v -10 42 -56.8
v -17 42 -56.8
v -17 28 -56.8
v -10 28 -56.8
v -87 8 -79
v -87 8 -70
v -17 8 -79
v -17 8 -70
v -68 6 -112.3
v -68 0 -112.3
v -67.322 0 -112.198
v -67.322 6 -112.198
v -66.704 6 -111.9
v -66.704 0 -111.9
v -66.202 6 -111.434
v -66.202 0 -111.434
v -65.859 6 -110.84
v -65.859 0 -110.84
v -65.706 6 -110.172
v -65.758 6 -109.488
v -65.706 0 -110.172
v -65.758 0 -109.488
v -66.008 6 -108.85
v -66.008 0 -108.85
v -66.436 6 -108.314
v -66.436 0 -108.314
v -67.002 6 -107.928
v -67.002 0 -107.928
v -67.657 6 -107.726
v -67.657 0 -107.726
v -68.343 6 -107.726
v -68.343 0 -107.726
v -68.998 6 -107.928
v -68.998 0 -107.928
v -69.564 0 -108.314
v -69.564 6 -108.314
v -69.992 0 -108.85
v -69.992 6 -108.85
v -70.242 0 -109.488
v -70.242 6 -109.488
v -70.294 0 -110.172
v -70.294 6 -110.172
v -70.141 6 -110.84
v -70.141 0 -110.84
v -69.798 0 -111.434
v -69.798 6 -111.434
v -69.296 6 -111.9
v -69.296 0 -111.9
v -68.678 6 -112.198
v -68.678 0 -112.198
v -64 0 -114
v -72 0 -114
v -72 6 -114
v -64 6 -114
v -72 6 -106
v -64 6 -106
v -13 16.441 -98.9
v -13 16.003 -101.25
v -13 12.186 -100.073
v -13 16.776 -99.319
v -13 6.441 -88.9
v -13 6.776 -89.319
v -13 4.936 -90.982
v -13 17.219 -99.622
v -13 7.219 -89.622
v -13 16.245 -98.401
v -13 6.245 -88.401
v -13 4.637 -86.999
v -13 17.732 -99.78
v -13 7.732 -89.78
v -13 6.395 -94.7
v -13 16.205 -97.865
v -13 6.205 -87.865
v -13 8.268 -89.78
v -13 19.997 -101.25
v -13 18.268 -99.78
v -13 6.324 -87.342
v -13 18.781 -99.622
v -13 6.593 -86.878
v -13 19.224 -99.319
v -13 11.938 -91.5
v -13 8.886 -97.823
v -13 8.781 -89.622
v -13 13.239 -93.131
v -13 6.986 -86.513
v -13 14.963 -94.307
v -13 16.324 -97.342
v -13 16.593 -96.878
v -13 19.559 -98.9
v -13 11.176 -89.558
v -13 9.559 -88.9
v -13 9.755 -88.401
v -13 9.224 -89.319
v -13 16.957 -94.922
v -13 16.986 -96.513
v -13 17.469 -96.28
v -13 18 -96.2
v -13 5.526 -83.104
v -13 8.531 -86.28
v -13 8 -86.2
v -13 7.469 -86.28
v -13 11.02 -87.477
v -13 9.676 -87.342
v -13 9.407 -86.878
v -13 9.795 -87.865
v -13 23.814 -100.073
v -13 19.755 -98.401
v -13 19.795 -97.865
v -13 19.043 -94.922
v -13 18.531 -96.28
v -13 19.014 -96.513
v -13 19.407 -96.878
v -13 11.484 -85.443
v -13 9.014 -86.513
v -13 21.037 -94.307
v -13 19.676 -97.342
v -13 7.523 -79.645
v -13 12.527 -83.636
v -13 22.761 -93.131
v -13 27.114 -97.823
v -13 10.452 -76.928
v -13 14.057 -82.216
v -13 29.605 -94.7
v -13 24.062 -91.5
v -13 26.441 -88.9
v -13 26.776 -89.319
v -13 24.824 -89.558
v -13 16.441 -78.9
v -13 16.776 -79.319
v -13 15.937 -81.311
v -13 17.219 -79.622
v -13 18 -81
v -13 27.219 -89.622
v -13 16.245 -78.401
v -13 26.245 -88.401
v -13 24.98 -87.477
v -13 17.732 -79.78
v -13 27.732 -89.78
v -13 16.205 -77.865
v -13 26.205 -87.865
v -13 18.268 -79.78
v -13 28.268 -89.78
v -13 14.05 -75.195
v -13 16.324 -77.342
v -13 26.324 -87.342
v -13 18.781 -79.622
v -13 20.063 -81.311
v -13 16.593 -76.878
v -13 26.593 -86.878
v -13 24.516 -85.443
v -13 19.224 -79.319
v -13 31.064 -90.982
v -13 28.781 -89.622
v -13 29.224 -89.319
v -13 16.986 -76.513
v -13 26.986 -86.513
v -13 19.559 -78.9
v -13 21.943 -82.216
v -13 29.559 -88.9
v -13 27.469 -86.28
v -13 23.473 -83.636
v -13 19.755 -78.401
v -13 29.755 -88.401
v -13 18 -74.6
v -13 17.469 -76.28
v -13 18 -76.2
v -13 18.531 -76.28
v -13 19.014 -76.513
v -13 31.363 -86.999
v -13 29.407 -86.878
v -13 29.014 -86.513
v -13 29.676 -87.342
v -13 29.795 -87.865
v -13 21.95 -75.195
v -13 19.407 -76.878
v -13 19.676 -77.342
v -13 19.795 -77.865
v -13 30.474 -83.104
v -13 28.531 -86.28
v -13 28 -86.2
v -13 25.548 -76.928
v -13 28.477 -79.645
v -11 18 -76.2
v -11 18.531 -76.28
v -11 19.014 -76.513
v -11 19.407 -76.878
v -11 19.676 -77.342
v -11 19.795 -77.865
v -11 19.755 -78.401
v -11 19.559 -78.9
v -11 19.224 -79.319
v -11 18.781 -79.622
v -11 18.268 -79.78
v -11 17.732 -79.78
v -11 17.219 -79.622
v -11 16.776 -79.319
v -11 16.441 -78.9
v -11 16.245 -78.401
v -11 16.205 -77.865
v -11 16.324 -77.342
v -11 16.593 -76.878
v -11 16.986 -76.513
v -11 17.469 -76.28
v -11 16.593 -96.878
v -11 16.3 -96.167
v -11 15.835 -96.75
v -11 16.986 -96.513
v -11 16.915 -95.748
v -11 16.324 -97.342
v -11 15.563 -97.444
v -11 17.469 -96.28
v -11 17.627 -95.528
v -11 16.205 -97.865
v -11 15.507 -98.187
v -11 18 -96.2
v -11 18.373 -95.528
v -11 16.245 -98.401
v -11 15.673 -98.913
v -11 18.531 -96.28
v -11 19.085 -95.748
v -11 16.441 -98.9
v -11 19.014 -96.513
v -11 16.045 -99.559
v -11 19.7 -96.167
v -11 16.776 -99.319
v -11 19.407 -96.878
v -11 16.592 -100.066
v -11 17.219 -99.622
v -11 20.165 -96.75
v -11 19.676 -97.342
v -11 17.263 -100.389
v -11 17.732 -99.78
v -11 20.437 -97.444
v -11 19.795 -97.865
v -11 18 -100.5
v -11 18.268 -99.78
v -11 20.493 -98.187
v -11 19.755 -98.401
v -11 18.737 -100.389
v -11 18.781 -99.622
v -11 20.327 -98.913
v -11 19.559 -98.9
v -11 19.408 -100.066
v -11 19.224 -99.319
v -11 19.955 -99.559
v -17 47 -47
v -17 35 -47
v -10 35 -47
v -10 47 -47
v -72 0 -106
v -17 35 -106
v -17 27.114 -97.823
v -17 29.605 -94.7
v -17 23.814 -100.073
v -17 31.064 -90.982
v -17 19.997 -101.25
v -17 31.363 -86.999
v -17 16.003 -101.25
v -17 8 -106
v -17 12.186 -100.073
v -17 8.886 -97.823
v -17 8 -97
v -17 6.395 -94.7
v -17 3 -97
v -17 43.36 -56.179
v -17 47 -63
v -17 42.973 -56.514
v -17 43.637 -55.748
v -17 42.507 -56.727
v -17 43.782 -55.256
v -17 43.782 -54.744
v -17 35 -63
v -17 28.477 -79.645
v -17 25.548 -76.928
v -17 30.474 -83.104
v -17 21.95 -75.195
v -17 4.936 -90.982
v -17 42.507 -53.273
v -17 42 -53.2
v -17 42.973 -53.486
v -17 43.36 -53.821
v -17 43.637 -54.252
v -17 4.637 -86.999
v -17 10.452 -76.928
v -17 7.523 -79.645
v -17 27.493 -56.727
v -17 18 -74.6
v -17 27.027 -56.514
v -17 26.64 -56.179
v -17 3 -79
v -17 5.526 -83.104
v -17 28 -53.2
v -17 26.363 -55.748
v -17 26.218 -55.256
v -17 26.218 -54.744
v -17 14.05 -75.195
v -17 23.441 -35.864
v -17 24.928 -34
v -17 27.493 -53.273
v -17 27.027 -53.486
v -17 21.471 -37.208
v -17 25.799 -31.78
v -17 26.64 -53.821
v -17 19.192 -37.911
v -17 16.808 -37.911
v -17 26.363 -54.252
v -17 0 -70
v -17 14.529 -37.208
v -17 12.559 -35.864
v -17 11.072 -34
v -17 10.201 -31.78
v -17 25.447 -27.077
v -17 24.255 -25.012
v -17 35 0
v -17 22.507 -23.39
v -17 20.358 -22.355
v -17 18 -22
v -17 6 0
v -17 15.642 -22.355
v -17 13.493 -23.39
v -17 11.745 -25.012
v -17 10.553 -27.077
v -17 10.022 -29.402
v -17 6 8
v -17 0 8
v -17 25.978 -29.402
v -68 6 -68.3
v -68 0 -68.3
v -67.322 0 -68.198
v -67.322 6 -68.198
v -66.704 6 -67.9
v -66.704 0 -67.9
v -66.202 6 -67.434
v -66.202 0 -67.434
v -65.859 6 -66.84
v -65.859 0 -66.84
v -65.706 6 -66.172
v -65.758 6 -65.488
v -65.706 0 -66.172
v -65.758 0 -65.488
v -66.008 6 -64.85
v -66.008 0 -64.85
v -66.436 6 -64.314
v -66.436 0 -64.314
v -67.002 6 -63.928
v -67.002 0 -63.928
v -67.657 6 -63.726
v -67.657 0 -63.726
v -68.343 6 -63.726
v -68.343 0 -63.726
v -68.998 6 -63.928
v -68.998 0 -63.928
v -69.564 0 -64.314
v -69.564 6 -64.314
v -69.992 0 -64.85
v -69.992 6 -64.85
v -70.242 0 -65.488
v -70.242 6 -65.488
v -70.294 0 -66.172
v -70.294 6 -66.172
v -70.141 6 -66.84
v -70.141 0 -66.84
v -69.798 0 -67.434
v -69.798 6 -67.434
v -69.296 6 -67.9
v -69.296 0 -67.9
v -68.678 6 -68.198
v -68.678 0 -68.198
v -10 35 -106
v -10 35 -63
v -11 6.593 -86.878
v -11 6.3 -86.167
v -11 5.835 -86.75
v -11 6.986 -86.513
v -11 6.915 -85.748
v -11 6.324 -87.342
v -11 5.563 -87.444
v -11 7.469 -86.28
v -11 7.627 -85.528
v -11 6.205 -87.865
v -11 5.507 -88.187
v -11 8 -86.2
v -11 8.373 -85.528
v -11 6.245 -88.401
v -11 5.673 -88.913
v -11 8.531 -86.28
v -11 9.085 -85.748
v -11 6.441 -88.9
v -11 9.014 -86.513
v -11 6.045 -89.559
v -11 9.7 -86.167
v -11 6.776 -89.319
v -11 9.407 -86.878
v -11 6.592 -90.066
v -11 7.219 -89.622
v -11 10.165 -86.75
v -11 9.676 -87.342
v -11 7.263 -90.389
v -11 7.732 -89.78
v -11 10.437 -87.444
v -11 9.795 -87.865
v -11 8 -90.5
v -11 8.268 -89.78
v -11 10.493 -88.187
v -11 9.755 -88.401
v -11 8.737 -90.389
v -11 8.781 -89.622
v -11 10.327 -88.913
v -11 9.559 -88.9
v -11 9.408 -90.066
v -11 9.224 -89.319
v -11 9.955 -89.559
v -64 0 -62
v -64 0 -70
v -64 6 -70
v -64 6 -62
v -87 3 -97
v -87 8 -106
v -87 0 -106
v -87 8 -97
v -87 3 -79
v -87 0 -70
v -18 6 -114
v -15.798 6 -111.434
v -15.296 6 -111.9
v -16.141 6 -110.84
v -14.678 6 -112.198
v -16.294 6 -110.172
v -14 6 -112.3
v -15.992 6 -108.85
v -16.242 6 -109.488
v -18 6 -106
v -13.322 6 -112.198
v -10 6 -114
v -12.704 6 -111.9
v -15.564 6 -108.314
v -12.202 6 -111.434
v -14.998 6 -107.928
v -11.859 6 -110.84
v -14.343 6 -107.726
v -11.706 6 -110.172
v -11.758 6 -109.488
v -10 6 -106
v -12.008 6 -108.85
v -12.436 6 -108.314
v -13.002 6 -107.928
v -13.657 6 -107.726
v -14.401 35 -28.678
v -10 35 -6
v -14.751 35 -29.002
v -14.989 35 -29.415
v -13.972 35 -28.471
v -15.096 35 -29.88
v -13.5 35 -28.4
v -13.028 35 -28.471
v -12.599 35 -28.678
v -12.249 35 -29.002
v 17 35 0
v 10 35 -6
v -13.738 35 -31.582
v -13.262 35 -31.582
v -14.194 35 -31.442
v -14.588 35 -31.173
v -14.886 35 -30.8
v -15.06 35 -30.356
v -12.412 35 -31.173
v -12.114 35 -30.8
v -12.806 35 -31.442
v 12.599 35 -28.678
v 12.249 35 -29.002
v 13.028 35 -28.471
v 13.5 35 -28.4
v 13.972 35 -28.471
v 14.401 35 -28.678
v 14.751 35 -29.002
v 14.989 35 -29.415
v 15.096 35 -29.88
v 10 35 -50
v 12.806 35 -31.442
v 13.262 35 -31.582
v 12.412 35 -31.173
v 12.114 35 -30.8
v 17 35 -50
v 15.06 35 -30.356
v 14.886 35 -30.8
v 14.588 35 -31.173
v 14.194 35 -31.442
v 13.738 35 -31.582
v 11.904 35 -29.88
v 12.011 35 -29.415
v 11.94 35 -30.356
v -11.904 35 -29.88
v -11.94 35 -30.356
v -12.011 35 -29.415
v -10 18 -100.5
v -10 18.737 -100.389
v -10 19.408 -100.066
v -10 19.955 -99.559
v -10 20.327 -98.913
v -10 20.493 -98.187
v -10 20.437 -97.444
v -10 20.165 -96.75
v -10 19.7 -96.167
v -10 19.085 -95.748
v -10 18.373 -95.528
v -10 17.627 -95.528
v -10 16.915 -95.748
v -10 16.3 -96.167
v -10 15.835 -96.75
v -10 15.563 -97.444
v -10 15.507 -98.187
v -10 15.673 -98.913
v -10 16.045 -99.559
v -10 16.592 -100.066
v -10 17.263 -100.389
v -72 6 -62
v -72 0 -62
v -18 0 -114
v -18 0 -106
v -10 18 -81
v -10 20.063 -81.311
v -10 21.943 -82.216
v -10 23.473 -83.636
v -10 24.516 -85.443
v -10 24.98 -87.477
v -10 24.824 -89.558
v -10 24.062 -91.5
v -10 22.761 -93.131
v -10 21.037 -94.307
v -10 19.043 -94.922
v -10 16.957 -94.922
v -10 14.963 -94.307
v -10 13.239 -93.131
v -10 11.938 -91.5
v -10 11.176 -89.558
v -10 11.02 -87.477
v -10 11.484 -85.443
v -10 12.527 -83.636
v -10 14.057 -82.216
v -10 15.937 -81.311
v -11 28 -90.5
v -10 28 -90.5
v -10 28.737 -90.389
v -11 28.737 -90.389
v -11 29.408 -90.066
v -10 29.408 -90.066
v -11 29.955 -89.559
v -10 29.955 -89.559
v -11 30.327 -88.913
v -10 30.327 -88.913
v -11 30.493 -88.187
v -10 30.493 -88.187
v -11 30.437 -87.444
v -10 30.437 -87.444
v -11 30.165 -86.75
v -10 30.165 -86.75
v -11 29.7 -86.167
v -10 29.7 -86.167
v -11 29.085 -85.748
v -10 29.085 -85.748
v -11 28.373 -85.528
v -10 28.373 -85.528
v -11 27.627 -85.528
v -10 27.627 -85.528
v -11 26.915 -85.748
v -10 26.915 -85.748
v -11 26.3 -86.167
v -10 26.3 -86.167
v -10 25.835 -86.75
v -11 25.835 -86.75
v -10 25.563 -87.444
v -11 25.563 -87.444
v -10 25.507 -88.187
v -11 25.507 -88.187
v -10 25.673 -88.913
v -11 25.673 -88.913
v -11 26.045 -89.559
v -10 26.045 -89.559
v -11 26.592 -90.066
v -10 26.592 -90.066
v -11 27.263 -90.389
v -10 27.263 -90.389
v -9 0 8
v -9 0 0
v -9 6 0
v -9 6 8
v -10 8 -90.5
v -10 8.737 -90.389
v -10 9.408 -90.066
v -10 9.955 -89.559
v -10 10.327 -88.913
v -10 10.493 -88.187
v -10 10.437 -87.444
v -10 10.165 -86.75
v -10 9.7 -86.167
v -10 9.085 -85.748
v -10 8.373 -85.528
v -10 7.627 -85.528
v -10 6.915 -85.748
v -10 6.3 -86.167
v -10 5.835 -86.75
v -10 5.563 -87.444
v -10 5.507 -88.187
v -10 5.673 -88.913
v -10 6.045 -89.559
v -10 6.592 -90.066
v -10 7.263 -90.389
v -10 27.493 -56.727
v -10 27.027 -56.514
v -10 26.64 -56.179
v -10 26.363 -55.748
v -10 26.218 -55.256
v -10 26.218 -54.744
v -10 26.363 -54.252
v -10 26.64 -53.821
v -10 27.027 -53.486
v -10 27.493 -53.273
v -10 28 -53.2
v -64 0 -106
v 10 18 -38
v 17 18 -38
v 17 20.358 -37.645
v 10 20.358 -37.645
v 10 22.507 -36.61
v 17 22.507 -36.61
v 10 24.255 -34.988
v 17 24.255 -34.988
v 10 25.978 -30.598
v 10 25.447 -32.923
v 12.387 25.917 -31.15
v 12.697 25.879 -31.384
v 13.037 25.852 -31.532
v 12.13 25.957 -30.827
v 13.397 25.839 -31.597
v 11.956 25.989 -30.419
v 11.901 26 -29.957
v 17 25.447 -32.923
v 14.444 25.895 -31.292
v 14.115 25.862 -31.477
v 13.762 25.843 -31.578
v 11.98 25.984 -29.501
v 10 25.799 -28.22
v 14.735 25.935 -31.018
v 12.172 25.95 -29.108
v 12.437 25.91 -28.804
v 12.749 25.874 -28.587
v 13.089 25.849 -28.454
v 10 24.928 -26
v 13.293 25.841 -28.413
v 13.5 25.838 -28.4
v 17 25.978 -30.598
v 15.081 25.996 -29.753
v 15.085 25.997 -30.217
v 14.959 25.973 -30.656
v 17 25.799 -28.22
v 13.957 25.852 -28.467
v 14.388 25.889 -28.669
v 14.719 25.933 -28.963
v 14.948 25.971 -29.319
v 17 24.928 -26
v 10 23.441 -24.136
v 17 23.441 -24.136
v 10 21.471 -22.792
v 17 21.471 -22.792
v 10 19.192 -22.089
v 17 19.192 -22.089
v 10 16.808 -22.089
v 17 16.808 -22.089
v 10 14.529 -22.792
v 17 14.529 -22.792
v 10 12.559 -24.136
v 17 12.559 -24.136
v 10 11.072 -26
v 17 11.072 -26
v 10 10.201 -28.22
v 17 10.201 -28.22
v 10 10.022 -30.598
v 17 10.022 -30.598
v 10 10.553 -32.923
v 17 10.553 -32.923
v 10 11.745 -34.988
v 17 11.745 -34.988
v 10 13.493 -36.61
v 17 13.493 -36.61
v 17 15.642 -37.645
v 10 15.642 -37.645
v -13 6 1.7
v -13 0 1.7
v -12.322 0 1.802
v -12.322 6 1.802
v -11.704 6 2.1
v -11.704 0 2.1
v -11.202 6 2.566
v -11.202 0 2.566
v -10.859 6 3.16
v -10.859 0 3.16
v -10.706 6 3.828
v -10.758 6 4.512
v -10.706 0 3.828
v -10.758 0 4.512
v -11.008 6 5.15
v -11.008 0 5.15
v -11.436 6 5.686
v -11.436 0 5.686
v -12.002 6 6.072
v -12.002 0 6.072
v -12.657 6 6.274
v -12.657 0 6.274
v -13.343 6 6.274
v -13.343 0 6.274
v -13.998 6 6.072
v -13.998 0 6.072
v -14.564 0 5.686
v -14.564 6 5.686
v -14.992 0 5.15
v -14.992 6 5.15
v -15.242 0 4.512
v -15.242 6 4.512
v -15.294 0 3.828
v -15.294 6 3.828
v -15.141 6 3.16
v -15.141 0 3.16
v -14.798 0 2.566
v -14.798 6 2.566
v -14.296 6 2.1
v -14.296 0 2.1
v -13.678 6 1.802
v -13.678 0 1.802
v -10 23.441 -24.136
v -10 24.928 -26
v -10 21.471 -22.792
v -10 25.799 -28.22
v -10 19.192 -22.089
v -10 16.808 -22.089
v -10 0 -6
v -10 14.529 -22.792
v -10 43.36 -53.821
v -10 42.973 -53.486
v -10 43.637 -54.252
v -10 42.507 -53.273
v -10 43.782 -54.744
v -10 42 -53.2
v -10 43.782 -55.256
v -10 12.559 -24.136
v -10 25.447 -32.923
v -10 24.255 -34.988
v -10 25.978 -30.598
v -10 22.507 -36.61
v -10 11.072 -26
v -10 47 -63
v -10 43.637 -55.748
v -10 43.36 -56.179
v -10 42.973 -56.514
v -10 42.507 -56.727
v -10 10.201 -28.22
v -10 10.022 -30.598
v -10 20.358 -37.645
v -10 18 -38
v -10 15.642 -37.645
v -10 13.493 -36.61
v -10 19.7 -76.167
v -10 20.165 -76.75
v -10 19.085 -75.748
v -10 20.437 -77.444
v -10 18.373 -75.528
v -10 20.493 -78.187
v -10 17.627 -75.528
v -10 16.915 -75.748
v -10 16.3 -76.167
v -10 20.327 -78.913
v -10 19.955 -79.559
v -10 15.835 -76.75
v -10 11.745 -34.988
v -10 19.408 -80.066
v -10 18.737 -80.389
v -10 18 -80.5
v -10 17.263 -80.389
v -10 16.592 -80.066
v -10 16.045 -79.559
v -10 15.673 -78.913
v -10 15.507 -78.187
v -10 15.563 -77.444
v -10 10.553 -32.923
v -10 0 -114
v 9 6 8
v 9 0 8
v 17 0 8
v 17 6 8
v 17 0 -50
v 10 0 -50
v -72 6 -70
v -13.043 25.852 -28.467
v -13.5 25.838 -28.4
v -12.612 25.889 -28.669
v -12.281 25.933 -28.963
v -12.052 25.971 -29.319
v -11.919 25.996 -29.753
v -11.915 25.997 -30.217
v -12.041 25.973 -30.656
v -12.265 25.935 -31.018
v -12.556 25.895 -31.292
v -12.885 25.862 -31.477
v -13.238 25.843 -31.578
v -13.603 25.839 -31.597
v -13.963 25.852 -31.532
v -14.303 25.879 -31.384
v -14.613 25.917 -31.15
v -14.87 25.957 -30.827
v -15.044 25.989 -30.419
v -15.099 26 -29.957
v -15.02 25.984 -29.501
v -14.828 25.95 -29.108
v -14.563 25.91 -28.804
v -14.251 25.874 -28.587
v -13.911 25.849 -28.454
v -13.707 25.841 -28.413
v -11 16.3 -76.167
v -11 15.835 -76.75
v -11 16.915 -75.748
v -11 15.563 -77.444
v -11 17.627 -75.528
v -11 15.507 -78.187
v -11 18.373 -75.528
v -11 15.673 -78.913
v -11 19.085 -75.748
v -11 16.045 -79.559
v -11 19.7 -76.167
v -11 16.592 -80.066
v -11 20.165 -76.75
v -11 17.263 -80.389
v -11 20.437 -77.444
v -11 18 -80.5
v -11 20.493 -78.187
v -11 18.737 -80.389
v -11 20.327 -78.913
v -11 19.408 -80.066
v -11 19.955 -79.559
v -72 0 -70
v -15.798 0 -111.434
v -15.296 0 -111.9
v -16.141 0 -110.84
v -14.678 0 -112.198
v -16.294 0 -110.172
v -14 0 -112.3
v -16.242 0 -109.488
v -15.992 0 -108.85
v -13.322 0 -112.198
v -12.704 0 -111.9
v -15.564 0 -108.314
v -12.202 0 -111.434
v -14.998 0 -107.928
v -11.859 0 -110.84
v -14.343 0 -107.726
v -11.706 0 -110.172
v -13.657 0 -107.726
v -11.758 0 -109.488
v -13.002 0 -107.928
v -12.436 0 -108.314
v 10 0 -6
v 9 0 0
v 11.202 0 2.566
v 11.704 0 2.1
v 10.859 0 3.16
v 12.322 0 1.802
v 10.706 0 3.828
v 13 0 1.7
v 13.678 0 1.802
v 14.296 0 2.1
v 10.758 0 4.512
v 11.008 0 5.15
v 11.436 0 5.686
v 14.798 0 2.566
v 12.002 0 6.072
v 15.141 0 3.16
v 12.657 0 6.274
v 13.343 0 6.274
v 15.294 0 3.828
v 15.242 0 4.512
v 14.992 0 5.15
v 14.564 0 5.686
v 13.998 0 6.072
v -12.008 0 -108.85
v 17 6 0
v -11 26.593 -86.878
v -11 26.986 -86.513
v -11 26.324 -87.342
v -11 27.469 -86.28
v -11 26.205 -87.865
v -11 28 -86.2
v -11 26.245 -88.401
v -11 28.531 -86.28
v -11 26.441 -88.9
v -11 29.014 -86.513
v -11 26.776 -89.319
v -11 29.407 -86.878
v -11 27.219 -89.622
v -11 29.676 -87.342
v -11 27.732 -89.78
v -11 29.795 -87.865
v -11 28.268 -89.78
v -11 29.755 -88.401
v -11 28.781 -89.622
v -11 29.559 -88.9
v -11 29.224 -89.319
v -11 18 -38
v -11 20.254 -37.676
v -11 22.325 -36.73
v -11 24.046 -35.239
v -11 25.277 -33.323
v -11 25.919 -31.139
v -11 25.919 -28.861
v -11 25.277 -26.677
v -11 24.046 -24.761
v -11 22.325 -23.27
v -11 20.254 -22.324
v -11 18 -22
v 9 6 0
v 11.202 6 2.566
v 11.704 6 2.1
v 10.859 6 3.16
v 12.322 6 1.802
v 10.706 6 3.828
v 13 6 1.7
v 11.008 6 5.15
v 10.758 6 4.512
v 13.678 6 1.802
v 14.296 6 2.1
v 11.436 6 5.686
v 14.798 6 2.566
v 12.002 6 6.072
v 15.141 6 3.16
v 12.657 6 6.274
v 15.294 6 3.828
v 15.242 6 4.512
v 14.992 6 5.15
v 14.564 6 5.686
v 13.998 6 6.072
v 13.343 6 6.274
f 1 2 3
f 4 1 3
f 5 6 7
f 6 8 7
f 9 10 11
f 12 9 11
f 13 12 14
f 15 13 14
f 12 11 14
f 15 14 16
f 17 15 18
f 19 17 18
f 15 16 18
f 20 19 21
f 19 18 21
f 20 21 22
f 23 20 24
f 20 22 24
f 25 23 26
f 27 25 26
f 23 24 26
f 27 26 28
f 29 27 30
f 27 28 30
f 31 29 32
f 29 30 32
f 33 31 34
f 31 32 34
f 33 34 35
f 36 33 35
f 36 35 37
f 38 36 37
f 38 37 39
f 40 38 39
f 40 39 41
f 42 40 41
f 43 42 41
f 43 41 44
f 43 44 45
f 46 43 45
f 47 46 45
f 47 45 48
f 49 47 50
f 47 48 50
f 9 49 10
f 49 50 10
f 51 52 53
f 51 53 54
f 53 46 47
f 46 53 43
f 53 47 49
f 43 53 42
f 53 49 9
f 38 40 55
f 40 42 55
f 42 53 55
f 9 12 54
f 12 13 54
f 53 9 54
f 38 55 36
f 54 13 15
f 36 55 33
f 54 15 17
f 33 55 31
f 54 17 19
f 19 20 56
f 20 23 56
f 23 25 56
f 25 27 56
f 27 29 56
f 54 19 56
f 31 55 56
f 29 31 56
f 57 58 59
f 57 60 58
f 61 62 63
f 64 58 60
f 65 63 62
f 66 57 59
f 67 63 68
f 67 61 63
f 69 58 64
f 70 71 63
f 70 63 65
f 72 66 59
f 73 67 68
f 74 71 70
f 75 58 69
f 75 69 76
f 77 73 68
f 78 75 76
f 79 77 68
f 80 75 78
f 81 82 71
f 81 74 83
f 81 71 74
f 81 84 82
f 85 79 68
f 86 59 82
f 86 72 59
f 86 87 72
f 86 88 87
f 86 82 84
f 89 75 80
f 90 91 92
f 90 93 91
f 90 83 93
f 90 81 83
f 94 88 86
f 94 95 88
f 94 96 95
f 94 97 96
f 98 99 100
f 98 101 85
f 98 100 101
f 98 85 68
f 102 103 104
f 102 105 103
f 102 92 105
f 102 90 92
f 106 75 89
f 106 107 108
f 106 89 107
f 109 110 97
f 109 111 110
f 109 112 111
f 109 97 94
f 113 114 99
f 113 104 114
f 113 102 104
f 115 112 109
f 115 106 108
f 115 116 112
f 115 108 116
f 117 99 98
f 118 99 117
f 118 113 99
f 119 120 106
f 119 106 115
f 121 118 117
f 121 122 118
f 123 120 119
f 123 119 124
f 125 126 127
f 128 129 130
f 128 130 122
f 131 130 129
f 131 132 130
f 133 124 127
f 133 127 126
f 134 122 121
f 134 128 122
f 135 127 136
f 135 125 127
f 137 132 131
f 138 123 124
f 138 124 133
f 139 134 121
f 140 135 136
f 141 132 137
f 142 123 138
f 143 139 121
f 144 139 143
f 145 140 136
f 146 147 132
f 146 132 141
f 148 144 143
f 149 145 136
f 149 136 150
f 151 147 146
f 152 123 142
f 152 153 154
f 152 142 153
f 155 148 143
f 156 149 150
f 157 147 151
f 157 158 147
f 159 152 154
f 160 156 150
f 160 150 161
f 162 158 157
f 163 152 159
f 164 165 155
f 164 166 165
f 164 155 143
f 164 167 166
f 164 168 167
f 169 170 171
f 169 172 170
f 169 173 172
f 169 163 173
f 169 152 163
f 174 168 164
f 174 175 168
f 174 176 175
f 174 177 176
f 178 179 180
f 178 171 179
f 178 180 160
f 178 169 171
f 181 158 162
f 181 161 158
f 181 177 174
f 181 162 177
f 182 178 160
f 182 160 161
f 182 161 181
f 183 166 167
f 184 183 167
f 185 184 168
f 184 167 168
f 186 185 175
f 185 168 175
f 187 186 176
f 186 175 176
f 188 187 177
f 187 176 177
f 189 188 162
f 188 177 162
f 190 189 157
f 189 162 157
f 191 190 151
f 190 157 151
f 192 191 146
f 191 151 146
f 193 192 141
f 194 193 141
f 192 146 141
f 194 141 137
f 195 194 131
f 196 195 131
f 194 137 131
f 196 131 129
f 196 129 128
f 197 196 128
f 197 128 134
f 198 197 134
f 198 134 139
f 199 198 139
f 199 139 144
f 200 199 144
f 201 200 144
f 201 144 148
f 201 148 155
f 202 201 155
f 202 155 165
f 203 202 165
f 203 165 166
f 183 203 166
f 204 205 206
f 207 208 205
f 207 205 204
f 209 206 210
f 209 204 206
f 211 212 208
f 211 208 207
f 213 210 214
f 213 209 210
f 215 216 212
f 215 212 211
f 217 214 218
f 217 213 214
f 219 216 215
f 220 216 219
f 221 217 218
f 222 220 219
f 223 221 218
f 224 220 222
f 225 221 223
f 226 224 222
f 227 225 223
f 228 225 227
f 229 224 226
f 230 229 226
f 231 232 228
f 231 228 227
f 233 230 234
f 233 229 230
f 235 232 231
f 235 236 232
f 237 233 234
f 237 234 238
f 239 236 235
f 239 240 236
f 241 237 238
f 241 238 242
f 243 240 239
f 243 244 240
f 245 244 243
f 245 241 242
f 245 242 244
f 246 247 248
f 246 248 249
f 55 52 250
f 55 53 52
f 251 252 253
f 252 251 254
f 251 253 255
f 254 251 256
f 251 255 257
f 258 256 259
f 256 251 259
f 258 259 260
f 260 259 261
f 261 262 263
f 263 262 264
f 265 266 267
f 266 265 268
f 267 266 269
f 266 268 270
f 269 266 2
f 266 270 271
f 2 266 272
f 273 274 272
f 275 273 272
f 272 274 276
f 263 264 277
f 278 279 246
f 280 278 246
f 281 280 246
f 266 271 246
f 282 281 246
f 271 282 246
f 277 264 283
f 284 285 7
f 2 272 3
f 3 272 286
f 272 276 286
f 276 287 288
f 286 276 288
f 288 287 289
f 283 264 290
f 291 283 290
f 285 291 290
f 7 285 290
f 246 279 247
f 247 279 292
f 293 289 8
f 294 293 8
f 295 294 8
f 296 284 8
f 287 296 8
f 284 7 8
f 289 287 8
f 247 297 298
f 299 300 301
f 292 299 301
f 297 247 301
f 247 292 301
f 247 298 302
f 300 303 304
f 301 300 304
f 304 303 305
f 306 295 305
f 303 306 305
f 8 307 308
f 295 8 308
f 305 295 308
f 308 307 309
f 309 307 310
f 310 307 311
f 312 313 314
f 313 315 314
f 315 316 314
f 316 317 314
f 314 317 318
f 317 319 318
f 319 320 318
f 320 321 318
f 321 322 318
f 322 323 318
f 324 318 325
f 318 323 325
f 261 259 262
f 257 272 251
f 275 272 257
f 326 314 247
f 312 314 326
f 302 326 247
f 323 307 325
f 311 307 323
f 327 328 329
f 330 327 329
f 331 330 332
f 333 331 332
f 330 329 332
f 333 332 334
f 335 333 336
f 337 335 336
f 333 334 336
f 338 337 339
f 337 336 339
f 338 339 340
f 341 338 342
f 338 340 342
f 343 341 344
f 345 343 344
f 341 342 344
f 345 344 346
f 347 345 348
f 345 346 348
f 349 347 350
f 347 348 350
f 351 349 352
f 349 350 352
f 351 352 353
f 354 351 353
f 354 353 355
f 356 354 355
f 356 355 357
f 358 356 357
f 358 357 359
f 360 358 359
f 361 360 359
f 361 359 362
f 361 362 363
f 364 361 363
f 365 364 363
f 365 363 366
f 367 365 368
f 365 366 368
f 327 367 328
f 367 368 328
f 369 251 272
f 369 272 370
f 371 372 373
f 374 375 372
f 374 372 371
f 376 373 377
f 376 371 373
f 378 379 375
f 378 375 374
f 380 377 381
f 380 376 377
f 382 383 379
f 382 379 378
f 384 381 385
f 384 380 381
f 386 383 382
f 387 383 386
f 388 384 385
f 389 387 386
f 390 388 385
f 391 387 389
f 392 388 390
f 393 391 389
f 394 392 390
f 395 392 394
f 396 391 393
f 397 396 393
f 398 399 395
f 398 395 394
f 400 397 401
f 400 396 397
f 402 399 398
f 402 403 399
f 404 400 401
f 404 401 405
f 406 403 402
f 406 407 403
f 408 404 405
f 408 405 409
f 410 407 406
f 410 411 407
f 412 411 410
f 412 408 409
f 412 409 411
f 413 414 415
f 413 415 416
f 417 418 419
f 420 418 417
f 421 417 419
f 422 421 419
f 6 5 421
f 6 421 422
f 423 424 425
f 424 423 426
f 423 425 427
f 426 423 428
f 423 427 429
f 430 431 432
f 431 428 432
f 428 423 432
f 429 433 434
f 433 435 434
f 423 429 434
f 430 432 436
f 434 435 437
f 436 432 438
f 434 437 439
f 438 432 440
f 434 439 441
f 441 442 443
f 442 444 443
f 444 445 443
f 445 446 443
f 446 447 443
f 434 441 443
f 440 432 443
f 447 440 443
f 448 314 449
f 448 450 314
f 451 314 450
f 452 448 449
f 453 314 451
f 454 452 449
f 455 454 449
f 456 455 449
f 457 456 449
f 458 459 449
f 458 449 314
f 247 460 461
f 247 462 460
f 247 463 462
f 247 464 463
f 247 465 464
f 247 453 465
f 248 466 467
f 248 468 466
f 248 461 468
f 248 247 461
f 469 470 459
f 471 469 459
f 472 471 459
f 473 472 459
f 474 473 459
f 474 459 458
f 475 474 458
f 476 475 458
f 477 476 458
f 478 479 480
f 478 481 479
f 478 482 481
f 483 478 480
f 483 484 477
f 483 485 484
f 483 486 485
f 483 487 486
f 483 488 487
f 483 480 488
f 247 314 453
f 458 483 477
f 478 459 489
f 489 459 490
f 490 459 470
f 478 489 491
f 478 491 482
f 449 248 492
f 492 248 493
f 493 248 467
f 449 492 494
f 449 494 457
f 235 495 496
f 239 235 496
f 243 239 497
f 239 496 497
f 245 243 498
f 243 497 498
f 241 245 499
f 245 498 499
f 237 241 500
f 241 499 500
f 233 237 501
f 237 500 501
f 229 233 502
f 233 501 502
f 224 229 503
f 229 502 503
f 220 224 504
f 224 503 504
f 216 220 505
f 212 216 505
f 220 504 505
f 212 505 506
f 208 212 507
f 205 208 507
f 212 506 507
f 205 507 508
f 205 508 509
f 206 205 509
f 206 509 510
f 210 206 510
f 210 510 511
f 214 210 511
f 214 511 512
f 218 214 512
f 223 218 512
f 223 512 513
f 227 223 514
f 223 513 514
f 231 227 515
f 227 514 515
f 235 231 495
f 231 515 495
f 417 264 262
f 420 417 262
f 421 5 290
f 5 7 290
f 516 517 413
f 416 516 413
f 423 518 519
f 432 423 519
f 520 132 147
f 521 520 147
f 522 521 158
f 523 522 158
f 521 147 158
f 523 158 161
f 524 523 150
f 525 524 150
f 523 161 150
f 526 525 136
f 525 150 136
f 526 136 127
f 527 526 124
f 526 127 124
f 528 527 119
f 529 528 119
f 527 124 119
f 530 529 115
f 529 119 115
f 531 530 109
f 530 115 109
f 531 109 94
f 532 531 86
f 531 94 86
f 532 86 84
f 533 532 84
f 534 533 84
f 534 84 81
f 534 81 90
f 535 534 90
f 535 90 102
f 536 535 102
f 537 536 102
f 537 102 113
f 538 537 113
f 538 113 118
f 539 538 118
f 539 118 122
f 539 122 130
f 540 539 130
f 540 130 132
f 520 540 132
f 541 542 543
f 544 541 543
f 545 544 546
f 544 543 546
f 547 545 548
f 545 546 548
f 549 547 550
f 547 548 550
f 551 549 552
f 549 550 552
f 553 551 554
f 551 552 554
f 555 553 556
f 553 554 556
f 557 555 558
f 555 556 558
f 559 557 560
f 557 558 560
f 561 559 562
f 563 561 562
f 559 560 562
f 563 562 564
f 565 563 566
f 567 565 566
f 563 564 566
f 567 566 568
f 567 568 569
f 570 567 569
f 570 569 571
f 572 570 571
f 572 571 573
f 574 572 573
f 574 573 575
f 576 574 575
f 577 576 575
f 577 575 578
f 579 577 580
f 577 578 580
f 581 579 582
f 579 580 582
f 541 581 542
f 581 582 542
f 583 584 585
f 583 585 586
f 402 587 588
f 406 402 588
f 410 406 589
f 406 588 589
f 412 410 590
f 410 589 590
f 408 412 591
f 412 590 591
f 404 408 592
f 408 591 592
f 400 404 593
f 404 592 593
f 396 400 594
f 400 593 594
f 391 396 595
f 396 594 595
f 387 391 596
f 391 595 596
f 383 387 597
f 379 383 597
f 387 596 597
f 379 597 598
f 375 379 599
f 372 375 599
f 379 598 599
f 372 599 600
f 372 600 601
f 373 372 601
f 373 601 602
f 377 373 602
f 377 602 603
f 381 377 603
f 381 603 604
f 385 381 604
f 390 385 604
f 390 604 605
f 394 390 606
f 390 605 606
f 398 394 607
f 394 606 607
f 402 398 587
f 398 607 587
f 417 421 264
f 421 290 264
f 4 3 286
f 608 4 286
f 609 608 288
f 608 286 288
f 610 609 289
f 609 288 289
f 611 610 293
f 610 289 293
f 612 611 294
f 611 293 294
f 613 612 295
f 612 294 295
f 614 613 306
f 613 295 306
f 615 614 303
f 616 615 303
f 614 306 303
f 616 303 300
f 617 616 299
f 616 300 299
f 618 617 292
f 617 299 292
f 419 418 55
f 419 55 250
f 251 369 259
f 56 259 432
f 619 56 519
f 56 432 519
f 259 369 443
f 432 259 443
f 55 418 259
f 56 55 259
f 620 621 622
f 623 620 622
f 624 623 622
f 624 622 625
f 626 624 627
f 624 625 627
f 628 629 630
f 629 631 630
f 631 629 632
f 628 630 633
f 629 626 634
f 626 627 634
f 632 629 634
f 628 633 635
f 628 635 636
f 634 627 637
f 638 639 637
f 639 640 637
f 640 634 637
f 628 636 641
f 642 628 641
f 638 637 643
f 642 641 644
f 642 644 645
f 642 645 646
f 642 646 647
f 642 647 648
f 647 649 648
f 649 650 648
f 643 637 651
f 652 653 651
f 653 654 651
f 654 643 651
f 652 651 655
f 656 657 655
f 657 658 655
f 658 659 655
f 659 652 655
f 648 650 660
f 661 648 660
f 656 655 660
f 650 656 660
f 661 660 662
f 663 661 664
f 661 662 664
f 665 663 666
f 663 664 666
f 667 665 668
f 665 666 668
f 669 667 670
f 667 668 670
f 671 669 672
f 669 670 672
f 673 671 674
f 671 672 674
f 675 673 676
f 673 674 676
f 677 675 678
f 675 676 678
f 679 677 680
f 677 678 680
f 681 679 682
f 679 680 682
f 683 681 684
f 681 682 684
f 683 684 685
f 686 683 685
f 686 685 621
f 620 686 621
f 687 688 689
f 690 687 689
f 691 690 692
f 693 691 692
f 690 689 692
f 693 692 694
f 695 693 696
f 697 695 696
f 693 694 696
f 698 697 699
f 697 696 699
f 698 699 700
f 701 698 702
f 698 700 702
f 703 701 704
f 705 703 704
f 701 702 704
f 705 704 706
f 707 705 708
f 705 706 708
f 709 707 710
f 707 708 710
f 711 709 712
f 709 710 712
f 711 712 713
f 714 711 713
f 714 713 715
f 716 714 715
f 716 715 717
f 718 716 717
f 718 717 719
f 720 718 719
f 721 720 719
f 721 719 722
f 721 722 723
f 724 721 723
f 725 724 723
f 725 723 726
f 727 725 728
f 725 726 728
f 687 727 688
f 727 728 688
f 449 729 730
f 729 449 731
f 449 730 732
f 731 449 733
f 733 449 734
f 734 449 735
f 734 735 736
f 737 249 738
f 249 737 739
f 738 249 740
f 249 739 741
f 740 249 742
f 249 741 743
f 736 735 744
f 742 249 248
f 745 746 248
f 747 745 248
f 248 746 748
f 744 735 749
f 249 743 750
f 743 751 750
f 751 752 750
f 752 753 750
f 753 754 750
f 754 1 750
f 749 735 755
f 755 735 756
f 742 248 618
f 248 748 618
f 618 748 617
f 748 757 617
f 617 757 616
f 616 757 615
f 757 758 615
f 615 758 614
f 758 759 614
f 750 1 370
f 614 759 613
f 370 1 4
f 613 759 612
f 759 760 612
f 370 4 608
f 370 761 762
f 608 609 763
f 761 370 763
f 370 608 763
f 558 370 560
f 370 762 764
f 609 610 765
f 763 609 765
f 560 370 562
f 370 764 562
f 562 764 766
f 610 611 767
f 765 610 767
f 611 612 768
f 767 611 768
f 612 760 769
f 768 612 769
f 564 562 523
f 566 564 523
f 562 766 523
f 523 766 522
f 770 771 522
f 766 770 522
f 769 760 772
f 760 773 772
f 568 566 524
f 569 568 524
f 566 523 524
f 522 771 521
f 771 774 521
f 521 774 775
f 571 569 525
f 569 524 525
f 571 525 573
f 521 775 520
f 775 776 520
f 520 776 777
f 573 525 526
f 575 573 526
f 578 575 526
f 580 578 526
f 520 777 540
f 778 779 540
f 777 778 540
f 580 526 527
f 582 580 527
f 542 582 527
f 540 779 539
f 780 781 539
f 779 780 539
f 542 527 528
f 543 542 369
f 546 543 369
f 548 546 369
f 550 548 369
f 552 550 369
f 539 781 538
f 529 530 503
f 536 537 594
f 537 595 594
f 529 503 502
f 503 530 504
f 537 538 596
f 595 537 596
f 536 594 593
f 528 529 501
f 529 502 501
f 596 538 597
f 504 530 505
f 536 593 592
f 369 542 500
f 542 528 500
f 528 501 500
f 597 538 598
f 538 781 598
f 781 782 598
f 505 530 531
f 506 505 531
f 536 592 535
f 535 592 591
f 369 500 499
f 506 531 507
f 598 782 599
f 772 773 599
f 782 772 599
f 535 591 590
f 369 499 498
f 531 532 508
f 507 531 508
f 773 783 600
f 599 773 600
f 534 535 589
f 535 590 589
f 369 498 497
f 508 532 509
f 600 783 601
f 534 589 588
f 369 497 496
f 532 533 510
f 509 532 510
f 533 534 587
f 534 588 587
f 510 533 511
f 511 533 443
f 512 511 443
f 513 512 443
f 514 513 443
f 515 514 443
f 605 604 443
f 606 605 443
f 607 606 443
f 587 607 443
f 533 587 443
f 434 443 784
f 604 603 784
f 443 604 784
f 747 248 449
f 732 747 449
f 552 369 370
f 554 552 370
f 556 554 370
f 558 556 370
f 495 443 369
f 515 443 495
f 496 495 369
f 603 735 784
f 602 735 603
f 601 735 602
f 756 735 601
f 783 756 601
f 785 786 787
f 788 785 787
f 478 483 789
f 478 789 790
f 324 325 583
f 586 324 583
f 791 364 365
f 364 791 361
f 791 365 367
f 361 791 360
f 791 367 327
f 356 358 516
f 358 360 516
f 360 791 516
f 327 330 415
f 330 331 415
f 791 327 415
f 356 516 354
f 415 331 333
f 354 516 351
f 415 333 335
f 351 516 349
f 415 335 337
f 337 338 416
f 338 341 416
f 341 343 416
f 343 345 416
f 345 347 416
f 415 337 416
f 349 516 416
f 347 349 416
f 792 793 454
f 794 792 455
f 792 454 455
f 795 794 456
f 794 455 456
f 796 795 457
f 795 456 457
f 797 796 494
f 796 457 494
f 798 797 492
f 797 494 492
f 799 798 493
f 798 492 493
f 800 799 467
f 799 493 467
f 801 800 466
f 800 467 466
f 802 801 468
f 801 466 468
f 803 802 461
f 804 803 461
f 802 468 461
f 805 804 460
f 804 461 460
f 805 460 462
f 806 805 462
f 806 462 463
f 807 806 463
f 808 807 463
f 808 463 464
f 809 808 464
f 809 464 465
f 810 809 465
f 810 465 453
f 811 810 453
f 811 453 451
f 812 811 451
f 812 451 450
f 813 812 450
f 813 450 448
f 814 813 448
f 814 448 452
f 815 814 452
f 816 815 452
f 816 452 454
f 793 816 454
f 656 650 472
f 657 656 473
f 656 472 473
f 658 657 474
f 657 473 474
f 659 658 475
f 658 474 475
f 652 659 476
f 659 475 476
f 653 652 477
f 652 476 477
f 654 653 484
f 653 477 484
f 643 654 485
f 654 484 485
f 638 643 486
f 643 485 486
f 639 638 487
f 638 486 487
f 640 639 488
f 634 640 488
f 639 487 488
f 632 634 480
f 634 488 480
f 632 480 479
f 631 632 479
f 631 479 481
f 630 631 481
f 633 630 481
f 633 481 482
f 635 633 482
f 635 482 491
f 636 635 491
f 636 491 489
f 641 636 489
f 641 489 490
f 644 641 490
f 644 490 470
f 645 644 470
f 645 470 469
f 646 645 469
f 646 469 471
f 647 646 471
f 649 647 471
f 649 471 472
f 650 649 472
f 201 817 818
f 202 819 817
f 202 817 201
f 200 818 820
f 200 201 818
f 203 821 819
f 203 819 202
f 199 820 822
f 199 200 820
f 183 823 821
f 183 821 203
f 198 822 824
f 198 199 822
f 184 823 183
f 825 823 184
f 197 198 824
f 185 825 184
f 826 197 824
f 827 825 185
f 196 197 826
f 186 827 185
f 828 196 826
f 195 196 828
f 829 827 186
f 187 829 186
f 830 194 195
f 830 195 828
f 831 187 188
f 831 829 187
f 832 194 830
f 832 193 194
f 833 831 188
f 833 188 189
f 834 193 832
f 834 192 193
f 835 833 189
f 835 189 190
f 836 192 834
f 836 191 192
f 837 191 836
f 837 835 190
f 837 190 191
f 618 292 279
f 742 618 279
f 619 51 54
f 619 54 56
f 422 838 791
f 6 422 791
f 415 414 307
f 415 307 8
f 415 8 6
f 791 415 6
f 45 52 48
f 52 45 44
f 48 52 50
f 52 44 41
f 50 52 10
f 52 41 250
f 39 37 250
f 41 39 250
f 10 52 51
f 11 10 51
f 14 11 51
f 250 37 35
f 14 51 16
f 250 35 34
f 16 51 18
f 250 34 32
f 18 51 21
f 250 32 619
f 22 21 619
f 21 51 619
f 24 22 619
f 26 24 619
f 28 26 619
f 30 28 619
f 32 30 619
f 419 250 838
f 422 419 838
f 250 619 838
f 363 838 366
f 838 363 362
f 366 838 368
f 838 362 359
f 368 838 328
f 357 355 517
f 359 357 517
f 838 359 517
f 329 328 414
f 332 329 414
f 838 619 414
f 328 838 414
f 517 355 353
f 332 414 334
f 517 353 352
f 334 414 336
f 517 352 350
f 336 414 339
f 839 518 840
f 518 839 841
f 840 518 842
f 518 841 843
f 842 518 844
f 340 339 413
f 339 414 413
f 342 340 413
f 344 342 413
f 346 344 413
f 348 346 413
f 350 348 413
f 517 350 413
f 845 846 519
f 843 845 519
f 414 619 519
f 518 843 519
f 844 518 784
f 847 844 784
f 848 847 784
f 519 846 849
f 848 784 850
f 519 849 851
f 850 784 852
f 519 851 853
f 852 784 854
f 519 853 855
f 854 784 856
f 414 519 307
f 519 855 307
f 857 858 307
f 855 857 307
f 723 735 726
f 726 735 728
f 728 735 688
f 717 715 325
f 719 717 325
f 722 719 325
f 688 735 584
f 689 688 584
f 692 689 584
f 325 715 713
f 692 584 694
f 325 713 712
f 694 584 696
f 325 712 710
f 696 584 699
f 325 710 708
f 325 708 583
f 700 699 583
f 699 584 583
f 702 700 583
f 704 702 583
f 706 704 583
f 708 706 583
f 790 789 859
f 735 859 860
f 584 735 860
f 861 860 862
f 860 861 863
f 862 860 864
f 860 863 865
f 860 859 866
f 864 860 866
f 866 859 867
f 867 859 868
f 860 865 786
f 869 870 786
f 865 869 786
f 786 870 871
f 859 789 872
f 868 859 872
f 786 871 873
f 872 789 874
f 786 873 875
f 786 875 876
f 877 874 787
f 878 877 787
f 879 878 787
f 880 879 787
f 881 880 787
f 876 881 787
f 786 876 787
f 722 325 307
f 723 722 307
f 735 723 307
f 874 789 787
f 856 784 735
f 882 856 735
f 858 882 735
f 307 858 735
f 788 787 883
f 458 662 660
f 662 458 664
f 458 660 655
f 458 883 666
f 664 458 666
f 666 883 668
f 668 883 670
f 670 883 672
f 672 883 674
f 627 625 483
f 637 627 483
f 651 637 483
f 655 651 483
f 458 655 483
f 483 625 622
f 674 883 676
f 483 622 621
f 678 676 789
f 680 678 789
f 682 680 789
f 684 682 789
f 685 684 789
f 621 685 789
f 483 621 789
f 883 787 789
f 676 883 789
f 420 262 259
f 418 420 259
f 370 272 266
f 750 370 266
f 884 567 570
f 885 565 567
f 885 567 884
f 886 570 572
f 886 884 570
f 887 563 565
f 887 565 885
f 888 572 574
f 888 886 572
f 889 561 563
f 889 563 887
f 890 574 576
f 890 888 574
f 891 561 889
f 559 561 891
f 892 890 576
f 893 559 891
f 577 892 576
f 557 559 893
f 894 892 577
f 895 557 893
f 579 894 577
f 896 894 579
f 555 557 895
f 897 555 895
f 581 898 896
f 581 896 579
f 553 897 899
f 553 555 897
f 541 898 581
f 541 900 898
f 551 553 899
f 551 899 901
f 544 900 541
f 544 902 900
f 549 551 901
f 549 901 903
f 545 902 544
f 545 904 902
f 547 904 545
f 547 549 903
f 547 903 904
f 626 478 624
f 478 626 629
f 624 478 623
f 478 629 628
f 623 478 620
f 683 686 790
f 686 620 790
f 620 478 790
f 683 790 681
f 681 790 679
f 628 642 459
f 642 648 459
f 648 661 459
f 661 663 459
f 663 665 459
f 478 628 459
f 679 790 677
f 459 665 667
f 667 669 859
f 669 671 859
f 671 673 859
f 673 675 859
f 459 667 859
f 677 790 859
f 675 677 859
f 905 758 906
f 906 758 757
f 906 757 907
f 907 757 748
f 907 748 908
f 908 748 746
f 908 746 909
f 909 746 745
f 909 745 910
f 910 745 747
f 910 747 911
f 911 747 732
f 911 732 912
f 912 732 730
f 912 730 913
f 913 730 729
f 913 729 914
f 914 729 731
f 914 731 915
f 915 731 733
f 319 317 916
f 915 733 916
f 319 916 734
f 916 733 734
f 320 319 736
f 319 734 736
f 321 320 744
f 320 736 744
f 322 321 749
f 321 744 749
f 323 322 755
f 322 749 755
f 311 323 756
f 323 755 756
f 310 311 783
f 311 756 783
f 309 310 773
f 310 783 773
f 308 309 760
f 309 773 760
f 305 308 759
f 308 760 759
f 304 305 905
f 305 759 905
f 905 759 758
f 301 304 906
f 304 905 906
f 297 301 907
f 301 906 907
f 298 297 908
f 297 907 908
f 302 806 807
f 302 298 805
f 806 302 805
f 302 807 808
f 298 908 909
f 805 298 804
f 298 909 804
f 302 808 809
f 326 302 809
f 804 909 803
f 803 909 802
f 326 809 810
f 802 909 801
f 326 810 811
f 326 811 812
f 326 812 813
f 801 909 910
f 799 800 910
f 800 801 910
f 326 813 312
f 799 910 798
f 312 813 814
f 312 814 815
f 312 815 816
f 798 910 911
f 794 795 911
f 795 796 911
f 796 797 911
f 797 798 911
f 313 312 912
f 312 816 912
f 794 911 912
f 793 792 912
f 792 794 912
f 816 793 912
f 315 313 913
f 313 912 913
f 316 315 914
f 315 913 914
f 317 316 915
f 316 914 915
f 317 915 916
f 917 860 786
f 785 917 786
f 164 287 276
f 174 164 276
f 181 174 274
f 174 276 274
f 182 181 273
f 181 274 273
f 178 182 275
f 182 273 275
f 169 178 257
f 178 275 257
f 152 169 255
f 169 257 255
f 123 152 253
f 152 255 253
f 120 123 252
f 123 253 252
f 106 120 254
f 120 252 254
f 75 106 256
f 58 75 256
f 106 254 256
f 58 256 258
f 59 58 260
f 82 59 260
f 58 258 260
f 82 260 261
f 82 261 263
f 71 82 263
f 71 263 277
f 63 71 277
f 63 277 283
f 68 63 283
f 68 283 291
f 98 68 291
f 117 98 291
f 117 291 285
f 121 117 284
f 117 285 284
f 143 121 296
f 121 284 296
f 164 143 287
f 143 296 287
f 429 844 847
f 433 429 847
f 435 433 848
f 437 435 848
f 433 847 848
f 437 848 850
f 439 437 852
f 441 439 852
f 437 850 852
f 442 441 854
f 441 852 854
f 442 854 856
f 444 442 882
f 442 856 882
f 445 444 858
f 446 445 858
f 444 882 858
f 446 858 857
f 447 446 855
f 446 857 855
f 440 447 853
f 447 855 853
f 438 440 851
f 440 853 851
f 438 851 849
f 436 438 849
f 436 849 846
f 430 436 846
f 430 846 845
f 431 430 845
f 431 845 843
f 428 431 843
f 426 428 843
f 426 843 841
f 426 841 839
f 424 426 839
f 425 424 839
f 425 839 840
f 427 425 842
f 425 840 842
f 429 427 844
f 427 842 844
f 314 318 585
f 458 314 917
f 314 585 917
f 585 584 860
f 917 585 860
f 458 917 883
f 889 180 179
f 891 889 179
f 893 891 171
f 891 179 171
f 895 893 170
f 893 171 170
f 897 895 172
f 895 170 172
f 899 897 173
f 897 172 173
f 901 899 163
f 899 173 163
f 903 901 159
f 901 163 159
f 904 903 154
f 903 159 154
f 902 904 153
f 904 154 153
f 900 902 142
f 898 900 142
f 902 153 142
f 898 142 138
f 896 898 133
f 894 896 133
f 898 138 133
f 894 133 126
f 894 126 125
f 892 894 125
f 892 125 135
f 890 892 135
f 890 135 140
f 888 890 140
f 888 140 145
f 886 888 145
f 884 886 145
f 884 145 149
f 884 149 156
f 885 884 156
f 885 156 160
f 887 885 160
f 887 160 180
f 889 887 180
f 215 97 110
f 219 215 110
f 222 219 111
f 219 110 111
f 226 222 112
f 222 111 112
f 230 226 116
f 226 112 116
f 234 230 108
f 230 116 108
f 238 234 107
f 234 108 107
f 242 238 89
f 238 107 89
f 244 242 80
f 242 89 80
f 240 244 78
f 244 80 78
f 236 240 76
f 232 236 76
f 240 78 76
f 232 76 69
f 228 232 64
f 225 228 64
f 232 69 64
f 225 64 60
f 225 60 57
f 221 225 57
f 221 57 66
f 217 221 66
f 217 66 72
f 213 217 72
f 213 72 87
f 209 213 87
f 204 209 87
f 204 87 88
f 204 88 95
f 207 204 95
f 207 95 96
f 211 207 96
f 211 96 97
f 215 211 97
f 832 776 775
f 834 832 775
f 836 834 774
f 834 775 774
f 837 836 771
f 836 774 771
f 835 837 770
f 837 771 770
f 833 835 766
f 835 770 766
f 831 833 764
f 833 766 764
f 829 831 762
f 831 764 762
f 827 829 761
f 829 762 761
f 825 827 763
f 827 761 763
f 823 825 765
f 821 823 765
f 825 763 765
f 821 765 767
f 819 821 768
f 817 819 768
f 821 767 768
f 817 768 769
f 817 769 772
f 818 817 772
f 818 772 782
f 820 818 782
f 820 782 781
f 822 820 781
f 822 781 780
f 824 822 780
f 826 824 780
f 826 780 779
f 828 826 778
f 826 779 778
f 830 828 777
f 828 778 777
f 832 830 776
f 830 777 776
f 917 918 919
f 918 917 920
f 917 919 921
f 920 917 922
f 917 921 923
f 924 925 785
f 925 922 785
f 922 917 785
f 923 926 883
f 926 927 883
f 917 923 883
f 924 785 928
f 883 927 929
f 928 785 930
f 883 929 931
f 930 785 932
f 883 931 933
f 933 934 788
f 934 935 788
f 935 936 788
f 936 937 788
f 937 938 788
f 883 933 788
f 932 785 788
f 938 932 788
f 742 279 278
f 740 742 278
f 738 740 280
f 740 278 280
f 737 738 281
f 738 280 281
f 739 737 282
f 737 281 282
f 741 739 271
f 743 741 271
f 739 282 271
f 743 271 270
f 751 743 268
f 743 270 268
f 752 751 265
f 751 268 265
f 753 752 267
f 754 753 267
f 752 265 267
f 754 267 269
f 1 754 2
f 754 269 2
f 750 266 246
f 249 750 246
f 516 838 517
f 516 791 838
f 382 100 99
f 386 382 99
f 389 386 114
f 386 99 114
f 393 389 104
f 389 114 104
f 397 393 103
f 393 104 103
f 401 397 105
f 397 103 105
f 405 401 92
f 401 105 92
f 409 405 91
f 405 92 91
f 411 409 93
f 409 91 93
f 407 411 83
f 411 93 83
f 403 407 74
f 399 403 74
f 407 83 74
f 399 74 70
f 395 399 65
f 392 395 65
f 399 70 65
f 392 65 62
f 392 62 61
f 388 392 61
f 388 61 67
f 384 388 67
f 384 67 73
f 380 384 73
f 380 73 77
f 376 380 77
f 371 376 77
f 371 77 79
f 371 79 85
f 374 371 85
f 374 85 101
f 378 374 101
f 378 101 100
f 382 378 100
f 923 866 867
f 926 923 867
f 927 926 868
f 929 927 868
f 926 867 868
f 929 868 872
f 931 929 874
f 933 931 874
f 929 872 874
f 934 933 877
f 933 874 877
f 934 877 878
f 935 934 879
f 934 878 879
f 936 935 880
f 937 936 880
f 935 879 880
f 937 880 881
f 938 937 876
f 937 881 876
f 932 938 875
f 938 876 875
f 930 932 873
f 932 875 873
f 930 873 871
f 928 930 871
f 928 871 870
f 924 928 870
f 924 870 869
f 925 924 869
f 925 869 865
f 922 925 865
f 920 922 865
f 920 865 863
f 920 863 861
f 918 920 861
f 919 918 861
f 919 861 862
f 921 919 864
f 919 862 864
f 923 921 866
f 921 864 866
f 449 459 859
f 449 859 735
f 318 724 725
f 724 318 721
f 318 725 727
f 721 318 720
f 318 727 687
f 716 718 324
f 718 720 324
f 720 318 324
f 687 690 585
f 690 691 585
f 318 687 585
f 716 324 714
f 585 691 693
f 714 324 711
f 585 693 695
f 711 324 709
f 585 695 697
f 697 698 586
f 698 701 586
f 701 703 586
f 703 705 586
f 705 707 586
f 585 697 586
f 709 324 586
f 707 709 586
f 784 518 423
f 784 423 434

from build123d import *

# Parameters (mm, degrees)
BOSS_EXTRU_1_DEPTH      = 35
ESQUISSE2_R             = 8
ENL_V_MAT_EXTRU_1_DEPTH = 28
ESQUISSE4_R             = 1.8
ENL_V_MAT_EXTRU_2_DEPTH = 10
ESQUISSE4_3_R           = 13.4
ESQUISSE4_3_R_2         = 1.8
ESQUISSE4_3_R_3         = 7
ENL_V_MAT_EXTRU_3_DEPTH = 4
ESQUISSE4_4_R           = 7
ENL_V_MAT_EXTRU_4_DEPTH = 10
BOSS_EXTRU_2_DEPTH      = 55
ESQUISSE8_W             = 8
ESQUISSE8_H             = 8
ESQUISSE8_R             = 2.3
BOSS_EXTRU_3_DEPTH      = 6
ESQUISSE10_W            = 16
ESQUISSE10_H            = 12
BOSS_EXTRU_4_DEPTH      = 7
ENL_V_MAT_EXTRU_5_DEPTH = 10
ESQUISSE11_R            = 1.6
ENL_V_MAT_EXTRU_6_DEPTH = 10
ESQUISSE12_R            = 2.5
ENL_V_MAT_EXTRU_7_DEPTH = 1
ESQUISSE15_R            = 8
ENL_V_MAT_EXTRU_8_DEPTH = 10
BOSS_EXTRU_5_DEPTH      = 15


with BuildPart() as part:
    # Esquisse1 → Boss.-Extru.1 (new body)
    with BuildSketch(Plane(origin=(0, 0, 0), x_dir=(1, 0, 0), z_dir=(0, 1, 0))):
        Polygon((-17, 0), (17, 0), (17, 50), (10, 50), (10, 6), (-10, 6), (-10, 106), (-17, 106), align=None)
    extrude(amount=BOSS_EXTRU_1_DEPTH)

    # Esquisse2 → Enlèv. mat.-Extru.1 (cut)
    with BuildSketch(Plane(origin=(17, 0, 0), x_dir=(0, 0, -1), z_dir=(1, 0, 0))):
        with Locations((30, 18)):
            Circle(ESQUISSE2_R)
    extrude(amount=-ENL_V_MAT_EXTRU_1_DEPTH, mode=Mode.SUBTRACT)

    # Esquisse4 → Enlèv. mat.-Extru.2 (cut)
    with BuildSketch(Plane.ZY.offset(17)):
        with Locations((-88, 8)):
            Circle(ESQUISSE4_R)
        with Locations((-78, 18)):
            Circle(ESQUISSE4_R)
        with Locations((-88, 28)):
            Circle(ESQUISSE4_R)
        with Locations((-98, 18)):
            Circle(ESQUISSE4_R)
    extrude(amount=-ENL_V_MAT_EXTRU_2_DEPTH, mode=Mode.SUBTRACT)

    # Esquisse4<3> → Enlèv. mat.-Extru.3 (cut)
    with BuildSketch(Plane.ZY.offset(17)):
        with Locations((-88, 18)):
            Circle(ESQUISSE4_3_R)
        with Locations((-88, 8)):
            Circle(ESQUISSE4_3_R_2, mode=Mode.SUBTRACT)
        with Locations((-98, 18)):
            Circle(ESQUISSE4_3_R_2, mode=Mode.SUBTRACT)
        with Locations((-88, 18)):
            Circle(ESQUISSE4_3_R_3, mode=Mode.SUBTRACT)
        with Locations((-88, 28)):
            Circle(ESQUISSE4_3_R_2, mode=Mode.SUBTRACT)
        with Locations((-78, 18)):
            Circle(ESQUISSE4_3_R_2, mode=Mode.SUBTRACT)
    extrude(amount=-ENL_V_MAT_EXTRU_3_DEPTH, mode=Mode.SUBTRACT)

    # Esquisse4<4> → Enlèv. mat.-Extru.4 (cut)
    with BuildSketch(Plane.ZY.offset(17)):
        with Locations((-88, 18)):
            Circle(ESQUISSE4_4_R)
    extrude(amount=-ENL_V_MAT_EXTRU_4_DEPTH, mode=Mode.SUBTRACT)

    # Esquisse4<11> → Boss.-Extru.2 (add)
    with BuildSketch(Plane.ZY.offset(17)):
        Polygon((-70, 0), (-70, 8), (-79, 8), (-79, 3), (-97, 3), (-97, 8), (-106, 8), (-106, 0), align=None)
    extrude(amount=BOSS_EXTRU_2_DEPTH)

    # Esquisse8 → Boss.-Extru.3 (add)
    # profile 1 of 5: a face of its own
    with BuildSketch(Plane.XZ):
        with Locations((13, 4)):
            Rectangle(ESQUISSE8_W, ESQUISSE8_H)
        with Locations((13, 4)):
            Circle(ESQUISSE8_R, mode=Mode.SUBTRACT)
    # profile 2 of 5: a face of its own
    with BuildSketch(Plane.XZ):
        with Locations((-13, 4)):
            Rectangle(ESQUISSE8_W, ESQUISSE8_H)
        with Locations((-13, 4)):
            Circle(ESQUISSE8_R, mode=Mode.SUBTRACT)
    # profile 3 of 5: a face of its own
    with BuildSketch(Plane.XZ):
        with Locations((-68, -110)):
            Rectangle(ESQUISSE8_W, ESQUISSE8_H)
        with Locations((-68, -110)):
            Circle(ESQUISSE8_R, mode=Mode.SUBTRACT)
    # profile 4 of 5: a face of its own
    with BuildSketch(Plane.XZ):
        with Locations((-68, -66)):
            Rectangle(ESQUISSE8_W, ESQUISSE8_H)
        with Locations((-68, -66)):
            Circle(ESQUISSE8_R, mode=Mode.SUBTRACT)
    # profile 5 of 5: a face of its own
    with BuildSketch(Plane.XZ):
        with Locations((-14, -110)):
            Rectangle(ESQUISSE8_W, ESQUISSE8_H)
        with Locations((-14, -110)):
            Circle(ESQUISSE8_R, mode=Mode.SUBTRACT)
    extrude(amount=-BOSS_EXTRU_3_DEPTH)

    # Esquisse10 → Boss.-Extru.4 (add)
    with BuildSketch(Plane.ZY.offset(17)):
        with Locations((-55, 41)):
            Rectangle(ESQUISSE10_W, ESQUISSE10_H)
    extrude(amount=-BOSS_EXTRU_4_DEPTH)

    # Esquisse9 → Enlèv. mat.-Extru.5 (cut)
    with BuildSketch(Plane.ZY.offset(17)):
        with BuildLine():
            Line((-56.8, 42), (-56.8, 28))
            ThreePointArc((-56.8, 28), (-55, 26.2), (-53.2, 28))
            Line((-53.2, 28), (-53.2, 42))
            ThreePointArc((-53.2, 42), (-55, 43.8), (-56.8, 42))
        make_face()
    extrude(amount=-ENL_V_MAT_EXTRU_5_DEPTH, mode=Mode.SUBTRACT)

    # Esquisse11 → Enlèv. mat.-Extru.6 (cut)
    with BuildSketch(Plane(origin=(0, 35, 0), x_dir=(1, 0, 0), z_dir=(0, 1, 0))):
        with Locations((-13.5, 30)):
            Circle(ESQUISSE11_R)
        with Locations((13.5, 30)):
            Circle(ESQUISSE11_R)
    extrude(amount=-ENL_V_MAT_EXTRU_6_DEPTH, mode=Mode.SUBTRACT)

    # Esquisse12 → Enlèv. mat.-Extru.7 (cut)
    with BuildSketch(Plane(origin=(-10, 0, 0), x_dir=(0, 0, -1), z_dir=(1, 0, 0))):
        with Locations((88, 28)):
            Circle(ESQUISSE12_R)
        with Locations((98, 18)):
            Circle(ESQUISSE12_R)
        with Locations((88, 8)):
            Circle(ESQUISSE12_R)
        with Locations((78, 18)):
            Circle(ESQUISSE12_R)
    extrude(amount=-ENL_V_MAT_EXTRU_7_DEPTH, mode=Mode.SUBTRACT)

    # Esquisse15 → Enlèv. mat.-Extru.8 (cut)
    with BuildSketch(Plane(origin=(-11, 0, 0), x_dir=(0, 0, -1), z_dir=(1, 0, 0))):
        with Locations((30, 18)):
            Circle(ESQUISSE15_R)
    extrude(amount=-ENL_V_MAT_EXTRU_8_DEPTH, mode=Mode.SUBTRACT)

    # Esquisse16 → Boss.-Extru.5 (add)
    with BuildSketch(Plane.ZY.offset(72)):
        Polygon((-106, 8), (-106, 0), (-70, 0), (-70, 8), (-79, 8), (-79, 3), (-97, 3), (-97, 8), align=None)
    extrude(amount=BOSS_EXTRU_5_DEPTH)


solid = part.part
